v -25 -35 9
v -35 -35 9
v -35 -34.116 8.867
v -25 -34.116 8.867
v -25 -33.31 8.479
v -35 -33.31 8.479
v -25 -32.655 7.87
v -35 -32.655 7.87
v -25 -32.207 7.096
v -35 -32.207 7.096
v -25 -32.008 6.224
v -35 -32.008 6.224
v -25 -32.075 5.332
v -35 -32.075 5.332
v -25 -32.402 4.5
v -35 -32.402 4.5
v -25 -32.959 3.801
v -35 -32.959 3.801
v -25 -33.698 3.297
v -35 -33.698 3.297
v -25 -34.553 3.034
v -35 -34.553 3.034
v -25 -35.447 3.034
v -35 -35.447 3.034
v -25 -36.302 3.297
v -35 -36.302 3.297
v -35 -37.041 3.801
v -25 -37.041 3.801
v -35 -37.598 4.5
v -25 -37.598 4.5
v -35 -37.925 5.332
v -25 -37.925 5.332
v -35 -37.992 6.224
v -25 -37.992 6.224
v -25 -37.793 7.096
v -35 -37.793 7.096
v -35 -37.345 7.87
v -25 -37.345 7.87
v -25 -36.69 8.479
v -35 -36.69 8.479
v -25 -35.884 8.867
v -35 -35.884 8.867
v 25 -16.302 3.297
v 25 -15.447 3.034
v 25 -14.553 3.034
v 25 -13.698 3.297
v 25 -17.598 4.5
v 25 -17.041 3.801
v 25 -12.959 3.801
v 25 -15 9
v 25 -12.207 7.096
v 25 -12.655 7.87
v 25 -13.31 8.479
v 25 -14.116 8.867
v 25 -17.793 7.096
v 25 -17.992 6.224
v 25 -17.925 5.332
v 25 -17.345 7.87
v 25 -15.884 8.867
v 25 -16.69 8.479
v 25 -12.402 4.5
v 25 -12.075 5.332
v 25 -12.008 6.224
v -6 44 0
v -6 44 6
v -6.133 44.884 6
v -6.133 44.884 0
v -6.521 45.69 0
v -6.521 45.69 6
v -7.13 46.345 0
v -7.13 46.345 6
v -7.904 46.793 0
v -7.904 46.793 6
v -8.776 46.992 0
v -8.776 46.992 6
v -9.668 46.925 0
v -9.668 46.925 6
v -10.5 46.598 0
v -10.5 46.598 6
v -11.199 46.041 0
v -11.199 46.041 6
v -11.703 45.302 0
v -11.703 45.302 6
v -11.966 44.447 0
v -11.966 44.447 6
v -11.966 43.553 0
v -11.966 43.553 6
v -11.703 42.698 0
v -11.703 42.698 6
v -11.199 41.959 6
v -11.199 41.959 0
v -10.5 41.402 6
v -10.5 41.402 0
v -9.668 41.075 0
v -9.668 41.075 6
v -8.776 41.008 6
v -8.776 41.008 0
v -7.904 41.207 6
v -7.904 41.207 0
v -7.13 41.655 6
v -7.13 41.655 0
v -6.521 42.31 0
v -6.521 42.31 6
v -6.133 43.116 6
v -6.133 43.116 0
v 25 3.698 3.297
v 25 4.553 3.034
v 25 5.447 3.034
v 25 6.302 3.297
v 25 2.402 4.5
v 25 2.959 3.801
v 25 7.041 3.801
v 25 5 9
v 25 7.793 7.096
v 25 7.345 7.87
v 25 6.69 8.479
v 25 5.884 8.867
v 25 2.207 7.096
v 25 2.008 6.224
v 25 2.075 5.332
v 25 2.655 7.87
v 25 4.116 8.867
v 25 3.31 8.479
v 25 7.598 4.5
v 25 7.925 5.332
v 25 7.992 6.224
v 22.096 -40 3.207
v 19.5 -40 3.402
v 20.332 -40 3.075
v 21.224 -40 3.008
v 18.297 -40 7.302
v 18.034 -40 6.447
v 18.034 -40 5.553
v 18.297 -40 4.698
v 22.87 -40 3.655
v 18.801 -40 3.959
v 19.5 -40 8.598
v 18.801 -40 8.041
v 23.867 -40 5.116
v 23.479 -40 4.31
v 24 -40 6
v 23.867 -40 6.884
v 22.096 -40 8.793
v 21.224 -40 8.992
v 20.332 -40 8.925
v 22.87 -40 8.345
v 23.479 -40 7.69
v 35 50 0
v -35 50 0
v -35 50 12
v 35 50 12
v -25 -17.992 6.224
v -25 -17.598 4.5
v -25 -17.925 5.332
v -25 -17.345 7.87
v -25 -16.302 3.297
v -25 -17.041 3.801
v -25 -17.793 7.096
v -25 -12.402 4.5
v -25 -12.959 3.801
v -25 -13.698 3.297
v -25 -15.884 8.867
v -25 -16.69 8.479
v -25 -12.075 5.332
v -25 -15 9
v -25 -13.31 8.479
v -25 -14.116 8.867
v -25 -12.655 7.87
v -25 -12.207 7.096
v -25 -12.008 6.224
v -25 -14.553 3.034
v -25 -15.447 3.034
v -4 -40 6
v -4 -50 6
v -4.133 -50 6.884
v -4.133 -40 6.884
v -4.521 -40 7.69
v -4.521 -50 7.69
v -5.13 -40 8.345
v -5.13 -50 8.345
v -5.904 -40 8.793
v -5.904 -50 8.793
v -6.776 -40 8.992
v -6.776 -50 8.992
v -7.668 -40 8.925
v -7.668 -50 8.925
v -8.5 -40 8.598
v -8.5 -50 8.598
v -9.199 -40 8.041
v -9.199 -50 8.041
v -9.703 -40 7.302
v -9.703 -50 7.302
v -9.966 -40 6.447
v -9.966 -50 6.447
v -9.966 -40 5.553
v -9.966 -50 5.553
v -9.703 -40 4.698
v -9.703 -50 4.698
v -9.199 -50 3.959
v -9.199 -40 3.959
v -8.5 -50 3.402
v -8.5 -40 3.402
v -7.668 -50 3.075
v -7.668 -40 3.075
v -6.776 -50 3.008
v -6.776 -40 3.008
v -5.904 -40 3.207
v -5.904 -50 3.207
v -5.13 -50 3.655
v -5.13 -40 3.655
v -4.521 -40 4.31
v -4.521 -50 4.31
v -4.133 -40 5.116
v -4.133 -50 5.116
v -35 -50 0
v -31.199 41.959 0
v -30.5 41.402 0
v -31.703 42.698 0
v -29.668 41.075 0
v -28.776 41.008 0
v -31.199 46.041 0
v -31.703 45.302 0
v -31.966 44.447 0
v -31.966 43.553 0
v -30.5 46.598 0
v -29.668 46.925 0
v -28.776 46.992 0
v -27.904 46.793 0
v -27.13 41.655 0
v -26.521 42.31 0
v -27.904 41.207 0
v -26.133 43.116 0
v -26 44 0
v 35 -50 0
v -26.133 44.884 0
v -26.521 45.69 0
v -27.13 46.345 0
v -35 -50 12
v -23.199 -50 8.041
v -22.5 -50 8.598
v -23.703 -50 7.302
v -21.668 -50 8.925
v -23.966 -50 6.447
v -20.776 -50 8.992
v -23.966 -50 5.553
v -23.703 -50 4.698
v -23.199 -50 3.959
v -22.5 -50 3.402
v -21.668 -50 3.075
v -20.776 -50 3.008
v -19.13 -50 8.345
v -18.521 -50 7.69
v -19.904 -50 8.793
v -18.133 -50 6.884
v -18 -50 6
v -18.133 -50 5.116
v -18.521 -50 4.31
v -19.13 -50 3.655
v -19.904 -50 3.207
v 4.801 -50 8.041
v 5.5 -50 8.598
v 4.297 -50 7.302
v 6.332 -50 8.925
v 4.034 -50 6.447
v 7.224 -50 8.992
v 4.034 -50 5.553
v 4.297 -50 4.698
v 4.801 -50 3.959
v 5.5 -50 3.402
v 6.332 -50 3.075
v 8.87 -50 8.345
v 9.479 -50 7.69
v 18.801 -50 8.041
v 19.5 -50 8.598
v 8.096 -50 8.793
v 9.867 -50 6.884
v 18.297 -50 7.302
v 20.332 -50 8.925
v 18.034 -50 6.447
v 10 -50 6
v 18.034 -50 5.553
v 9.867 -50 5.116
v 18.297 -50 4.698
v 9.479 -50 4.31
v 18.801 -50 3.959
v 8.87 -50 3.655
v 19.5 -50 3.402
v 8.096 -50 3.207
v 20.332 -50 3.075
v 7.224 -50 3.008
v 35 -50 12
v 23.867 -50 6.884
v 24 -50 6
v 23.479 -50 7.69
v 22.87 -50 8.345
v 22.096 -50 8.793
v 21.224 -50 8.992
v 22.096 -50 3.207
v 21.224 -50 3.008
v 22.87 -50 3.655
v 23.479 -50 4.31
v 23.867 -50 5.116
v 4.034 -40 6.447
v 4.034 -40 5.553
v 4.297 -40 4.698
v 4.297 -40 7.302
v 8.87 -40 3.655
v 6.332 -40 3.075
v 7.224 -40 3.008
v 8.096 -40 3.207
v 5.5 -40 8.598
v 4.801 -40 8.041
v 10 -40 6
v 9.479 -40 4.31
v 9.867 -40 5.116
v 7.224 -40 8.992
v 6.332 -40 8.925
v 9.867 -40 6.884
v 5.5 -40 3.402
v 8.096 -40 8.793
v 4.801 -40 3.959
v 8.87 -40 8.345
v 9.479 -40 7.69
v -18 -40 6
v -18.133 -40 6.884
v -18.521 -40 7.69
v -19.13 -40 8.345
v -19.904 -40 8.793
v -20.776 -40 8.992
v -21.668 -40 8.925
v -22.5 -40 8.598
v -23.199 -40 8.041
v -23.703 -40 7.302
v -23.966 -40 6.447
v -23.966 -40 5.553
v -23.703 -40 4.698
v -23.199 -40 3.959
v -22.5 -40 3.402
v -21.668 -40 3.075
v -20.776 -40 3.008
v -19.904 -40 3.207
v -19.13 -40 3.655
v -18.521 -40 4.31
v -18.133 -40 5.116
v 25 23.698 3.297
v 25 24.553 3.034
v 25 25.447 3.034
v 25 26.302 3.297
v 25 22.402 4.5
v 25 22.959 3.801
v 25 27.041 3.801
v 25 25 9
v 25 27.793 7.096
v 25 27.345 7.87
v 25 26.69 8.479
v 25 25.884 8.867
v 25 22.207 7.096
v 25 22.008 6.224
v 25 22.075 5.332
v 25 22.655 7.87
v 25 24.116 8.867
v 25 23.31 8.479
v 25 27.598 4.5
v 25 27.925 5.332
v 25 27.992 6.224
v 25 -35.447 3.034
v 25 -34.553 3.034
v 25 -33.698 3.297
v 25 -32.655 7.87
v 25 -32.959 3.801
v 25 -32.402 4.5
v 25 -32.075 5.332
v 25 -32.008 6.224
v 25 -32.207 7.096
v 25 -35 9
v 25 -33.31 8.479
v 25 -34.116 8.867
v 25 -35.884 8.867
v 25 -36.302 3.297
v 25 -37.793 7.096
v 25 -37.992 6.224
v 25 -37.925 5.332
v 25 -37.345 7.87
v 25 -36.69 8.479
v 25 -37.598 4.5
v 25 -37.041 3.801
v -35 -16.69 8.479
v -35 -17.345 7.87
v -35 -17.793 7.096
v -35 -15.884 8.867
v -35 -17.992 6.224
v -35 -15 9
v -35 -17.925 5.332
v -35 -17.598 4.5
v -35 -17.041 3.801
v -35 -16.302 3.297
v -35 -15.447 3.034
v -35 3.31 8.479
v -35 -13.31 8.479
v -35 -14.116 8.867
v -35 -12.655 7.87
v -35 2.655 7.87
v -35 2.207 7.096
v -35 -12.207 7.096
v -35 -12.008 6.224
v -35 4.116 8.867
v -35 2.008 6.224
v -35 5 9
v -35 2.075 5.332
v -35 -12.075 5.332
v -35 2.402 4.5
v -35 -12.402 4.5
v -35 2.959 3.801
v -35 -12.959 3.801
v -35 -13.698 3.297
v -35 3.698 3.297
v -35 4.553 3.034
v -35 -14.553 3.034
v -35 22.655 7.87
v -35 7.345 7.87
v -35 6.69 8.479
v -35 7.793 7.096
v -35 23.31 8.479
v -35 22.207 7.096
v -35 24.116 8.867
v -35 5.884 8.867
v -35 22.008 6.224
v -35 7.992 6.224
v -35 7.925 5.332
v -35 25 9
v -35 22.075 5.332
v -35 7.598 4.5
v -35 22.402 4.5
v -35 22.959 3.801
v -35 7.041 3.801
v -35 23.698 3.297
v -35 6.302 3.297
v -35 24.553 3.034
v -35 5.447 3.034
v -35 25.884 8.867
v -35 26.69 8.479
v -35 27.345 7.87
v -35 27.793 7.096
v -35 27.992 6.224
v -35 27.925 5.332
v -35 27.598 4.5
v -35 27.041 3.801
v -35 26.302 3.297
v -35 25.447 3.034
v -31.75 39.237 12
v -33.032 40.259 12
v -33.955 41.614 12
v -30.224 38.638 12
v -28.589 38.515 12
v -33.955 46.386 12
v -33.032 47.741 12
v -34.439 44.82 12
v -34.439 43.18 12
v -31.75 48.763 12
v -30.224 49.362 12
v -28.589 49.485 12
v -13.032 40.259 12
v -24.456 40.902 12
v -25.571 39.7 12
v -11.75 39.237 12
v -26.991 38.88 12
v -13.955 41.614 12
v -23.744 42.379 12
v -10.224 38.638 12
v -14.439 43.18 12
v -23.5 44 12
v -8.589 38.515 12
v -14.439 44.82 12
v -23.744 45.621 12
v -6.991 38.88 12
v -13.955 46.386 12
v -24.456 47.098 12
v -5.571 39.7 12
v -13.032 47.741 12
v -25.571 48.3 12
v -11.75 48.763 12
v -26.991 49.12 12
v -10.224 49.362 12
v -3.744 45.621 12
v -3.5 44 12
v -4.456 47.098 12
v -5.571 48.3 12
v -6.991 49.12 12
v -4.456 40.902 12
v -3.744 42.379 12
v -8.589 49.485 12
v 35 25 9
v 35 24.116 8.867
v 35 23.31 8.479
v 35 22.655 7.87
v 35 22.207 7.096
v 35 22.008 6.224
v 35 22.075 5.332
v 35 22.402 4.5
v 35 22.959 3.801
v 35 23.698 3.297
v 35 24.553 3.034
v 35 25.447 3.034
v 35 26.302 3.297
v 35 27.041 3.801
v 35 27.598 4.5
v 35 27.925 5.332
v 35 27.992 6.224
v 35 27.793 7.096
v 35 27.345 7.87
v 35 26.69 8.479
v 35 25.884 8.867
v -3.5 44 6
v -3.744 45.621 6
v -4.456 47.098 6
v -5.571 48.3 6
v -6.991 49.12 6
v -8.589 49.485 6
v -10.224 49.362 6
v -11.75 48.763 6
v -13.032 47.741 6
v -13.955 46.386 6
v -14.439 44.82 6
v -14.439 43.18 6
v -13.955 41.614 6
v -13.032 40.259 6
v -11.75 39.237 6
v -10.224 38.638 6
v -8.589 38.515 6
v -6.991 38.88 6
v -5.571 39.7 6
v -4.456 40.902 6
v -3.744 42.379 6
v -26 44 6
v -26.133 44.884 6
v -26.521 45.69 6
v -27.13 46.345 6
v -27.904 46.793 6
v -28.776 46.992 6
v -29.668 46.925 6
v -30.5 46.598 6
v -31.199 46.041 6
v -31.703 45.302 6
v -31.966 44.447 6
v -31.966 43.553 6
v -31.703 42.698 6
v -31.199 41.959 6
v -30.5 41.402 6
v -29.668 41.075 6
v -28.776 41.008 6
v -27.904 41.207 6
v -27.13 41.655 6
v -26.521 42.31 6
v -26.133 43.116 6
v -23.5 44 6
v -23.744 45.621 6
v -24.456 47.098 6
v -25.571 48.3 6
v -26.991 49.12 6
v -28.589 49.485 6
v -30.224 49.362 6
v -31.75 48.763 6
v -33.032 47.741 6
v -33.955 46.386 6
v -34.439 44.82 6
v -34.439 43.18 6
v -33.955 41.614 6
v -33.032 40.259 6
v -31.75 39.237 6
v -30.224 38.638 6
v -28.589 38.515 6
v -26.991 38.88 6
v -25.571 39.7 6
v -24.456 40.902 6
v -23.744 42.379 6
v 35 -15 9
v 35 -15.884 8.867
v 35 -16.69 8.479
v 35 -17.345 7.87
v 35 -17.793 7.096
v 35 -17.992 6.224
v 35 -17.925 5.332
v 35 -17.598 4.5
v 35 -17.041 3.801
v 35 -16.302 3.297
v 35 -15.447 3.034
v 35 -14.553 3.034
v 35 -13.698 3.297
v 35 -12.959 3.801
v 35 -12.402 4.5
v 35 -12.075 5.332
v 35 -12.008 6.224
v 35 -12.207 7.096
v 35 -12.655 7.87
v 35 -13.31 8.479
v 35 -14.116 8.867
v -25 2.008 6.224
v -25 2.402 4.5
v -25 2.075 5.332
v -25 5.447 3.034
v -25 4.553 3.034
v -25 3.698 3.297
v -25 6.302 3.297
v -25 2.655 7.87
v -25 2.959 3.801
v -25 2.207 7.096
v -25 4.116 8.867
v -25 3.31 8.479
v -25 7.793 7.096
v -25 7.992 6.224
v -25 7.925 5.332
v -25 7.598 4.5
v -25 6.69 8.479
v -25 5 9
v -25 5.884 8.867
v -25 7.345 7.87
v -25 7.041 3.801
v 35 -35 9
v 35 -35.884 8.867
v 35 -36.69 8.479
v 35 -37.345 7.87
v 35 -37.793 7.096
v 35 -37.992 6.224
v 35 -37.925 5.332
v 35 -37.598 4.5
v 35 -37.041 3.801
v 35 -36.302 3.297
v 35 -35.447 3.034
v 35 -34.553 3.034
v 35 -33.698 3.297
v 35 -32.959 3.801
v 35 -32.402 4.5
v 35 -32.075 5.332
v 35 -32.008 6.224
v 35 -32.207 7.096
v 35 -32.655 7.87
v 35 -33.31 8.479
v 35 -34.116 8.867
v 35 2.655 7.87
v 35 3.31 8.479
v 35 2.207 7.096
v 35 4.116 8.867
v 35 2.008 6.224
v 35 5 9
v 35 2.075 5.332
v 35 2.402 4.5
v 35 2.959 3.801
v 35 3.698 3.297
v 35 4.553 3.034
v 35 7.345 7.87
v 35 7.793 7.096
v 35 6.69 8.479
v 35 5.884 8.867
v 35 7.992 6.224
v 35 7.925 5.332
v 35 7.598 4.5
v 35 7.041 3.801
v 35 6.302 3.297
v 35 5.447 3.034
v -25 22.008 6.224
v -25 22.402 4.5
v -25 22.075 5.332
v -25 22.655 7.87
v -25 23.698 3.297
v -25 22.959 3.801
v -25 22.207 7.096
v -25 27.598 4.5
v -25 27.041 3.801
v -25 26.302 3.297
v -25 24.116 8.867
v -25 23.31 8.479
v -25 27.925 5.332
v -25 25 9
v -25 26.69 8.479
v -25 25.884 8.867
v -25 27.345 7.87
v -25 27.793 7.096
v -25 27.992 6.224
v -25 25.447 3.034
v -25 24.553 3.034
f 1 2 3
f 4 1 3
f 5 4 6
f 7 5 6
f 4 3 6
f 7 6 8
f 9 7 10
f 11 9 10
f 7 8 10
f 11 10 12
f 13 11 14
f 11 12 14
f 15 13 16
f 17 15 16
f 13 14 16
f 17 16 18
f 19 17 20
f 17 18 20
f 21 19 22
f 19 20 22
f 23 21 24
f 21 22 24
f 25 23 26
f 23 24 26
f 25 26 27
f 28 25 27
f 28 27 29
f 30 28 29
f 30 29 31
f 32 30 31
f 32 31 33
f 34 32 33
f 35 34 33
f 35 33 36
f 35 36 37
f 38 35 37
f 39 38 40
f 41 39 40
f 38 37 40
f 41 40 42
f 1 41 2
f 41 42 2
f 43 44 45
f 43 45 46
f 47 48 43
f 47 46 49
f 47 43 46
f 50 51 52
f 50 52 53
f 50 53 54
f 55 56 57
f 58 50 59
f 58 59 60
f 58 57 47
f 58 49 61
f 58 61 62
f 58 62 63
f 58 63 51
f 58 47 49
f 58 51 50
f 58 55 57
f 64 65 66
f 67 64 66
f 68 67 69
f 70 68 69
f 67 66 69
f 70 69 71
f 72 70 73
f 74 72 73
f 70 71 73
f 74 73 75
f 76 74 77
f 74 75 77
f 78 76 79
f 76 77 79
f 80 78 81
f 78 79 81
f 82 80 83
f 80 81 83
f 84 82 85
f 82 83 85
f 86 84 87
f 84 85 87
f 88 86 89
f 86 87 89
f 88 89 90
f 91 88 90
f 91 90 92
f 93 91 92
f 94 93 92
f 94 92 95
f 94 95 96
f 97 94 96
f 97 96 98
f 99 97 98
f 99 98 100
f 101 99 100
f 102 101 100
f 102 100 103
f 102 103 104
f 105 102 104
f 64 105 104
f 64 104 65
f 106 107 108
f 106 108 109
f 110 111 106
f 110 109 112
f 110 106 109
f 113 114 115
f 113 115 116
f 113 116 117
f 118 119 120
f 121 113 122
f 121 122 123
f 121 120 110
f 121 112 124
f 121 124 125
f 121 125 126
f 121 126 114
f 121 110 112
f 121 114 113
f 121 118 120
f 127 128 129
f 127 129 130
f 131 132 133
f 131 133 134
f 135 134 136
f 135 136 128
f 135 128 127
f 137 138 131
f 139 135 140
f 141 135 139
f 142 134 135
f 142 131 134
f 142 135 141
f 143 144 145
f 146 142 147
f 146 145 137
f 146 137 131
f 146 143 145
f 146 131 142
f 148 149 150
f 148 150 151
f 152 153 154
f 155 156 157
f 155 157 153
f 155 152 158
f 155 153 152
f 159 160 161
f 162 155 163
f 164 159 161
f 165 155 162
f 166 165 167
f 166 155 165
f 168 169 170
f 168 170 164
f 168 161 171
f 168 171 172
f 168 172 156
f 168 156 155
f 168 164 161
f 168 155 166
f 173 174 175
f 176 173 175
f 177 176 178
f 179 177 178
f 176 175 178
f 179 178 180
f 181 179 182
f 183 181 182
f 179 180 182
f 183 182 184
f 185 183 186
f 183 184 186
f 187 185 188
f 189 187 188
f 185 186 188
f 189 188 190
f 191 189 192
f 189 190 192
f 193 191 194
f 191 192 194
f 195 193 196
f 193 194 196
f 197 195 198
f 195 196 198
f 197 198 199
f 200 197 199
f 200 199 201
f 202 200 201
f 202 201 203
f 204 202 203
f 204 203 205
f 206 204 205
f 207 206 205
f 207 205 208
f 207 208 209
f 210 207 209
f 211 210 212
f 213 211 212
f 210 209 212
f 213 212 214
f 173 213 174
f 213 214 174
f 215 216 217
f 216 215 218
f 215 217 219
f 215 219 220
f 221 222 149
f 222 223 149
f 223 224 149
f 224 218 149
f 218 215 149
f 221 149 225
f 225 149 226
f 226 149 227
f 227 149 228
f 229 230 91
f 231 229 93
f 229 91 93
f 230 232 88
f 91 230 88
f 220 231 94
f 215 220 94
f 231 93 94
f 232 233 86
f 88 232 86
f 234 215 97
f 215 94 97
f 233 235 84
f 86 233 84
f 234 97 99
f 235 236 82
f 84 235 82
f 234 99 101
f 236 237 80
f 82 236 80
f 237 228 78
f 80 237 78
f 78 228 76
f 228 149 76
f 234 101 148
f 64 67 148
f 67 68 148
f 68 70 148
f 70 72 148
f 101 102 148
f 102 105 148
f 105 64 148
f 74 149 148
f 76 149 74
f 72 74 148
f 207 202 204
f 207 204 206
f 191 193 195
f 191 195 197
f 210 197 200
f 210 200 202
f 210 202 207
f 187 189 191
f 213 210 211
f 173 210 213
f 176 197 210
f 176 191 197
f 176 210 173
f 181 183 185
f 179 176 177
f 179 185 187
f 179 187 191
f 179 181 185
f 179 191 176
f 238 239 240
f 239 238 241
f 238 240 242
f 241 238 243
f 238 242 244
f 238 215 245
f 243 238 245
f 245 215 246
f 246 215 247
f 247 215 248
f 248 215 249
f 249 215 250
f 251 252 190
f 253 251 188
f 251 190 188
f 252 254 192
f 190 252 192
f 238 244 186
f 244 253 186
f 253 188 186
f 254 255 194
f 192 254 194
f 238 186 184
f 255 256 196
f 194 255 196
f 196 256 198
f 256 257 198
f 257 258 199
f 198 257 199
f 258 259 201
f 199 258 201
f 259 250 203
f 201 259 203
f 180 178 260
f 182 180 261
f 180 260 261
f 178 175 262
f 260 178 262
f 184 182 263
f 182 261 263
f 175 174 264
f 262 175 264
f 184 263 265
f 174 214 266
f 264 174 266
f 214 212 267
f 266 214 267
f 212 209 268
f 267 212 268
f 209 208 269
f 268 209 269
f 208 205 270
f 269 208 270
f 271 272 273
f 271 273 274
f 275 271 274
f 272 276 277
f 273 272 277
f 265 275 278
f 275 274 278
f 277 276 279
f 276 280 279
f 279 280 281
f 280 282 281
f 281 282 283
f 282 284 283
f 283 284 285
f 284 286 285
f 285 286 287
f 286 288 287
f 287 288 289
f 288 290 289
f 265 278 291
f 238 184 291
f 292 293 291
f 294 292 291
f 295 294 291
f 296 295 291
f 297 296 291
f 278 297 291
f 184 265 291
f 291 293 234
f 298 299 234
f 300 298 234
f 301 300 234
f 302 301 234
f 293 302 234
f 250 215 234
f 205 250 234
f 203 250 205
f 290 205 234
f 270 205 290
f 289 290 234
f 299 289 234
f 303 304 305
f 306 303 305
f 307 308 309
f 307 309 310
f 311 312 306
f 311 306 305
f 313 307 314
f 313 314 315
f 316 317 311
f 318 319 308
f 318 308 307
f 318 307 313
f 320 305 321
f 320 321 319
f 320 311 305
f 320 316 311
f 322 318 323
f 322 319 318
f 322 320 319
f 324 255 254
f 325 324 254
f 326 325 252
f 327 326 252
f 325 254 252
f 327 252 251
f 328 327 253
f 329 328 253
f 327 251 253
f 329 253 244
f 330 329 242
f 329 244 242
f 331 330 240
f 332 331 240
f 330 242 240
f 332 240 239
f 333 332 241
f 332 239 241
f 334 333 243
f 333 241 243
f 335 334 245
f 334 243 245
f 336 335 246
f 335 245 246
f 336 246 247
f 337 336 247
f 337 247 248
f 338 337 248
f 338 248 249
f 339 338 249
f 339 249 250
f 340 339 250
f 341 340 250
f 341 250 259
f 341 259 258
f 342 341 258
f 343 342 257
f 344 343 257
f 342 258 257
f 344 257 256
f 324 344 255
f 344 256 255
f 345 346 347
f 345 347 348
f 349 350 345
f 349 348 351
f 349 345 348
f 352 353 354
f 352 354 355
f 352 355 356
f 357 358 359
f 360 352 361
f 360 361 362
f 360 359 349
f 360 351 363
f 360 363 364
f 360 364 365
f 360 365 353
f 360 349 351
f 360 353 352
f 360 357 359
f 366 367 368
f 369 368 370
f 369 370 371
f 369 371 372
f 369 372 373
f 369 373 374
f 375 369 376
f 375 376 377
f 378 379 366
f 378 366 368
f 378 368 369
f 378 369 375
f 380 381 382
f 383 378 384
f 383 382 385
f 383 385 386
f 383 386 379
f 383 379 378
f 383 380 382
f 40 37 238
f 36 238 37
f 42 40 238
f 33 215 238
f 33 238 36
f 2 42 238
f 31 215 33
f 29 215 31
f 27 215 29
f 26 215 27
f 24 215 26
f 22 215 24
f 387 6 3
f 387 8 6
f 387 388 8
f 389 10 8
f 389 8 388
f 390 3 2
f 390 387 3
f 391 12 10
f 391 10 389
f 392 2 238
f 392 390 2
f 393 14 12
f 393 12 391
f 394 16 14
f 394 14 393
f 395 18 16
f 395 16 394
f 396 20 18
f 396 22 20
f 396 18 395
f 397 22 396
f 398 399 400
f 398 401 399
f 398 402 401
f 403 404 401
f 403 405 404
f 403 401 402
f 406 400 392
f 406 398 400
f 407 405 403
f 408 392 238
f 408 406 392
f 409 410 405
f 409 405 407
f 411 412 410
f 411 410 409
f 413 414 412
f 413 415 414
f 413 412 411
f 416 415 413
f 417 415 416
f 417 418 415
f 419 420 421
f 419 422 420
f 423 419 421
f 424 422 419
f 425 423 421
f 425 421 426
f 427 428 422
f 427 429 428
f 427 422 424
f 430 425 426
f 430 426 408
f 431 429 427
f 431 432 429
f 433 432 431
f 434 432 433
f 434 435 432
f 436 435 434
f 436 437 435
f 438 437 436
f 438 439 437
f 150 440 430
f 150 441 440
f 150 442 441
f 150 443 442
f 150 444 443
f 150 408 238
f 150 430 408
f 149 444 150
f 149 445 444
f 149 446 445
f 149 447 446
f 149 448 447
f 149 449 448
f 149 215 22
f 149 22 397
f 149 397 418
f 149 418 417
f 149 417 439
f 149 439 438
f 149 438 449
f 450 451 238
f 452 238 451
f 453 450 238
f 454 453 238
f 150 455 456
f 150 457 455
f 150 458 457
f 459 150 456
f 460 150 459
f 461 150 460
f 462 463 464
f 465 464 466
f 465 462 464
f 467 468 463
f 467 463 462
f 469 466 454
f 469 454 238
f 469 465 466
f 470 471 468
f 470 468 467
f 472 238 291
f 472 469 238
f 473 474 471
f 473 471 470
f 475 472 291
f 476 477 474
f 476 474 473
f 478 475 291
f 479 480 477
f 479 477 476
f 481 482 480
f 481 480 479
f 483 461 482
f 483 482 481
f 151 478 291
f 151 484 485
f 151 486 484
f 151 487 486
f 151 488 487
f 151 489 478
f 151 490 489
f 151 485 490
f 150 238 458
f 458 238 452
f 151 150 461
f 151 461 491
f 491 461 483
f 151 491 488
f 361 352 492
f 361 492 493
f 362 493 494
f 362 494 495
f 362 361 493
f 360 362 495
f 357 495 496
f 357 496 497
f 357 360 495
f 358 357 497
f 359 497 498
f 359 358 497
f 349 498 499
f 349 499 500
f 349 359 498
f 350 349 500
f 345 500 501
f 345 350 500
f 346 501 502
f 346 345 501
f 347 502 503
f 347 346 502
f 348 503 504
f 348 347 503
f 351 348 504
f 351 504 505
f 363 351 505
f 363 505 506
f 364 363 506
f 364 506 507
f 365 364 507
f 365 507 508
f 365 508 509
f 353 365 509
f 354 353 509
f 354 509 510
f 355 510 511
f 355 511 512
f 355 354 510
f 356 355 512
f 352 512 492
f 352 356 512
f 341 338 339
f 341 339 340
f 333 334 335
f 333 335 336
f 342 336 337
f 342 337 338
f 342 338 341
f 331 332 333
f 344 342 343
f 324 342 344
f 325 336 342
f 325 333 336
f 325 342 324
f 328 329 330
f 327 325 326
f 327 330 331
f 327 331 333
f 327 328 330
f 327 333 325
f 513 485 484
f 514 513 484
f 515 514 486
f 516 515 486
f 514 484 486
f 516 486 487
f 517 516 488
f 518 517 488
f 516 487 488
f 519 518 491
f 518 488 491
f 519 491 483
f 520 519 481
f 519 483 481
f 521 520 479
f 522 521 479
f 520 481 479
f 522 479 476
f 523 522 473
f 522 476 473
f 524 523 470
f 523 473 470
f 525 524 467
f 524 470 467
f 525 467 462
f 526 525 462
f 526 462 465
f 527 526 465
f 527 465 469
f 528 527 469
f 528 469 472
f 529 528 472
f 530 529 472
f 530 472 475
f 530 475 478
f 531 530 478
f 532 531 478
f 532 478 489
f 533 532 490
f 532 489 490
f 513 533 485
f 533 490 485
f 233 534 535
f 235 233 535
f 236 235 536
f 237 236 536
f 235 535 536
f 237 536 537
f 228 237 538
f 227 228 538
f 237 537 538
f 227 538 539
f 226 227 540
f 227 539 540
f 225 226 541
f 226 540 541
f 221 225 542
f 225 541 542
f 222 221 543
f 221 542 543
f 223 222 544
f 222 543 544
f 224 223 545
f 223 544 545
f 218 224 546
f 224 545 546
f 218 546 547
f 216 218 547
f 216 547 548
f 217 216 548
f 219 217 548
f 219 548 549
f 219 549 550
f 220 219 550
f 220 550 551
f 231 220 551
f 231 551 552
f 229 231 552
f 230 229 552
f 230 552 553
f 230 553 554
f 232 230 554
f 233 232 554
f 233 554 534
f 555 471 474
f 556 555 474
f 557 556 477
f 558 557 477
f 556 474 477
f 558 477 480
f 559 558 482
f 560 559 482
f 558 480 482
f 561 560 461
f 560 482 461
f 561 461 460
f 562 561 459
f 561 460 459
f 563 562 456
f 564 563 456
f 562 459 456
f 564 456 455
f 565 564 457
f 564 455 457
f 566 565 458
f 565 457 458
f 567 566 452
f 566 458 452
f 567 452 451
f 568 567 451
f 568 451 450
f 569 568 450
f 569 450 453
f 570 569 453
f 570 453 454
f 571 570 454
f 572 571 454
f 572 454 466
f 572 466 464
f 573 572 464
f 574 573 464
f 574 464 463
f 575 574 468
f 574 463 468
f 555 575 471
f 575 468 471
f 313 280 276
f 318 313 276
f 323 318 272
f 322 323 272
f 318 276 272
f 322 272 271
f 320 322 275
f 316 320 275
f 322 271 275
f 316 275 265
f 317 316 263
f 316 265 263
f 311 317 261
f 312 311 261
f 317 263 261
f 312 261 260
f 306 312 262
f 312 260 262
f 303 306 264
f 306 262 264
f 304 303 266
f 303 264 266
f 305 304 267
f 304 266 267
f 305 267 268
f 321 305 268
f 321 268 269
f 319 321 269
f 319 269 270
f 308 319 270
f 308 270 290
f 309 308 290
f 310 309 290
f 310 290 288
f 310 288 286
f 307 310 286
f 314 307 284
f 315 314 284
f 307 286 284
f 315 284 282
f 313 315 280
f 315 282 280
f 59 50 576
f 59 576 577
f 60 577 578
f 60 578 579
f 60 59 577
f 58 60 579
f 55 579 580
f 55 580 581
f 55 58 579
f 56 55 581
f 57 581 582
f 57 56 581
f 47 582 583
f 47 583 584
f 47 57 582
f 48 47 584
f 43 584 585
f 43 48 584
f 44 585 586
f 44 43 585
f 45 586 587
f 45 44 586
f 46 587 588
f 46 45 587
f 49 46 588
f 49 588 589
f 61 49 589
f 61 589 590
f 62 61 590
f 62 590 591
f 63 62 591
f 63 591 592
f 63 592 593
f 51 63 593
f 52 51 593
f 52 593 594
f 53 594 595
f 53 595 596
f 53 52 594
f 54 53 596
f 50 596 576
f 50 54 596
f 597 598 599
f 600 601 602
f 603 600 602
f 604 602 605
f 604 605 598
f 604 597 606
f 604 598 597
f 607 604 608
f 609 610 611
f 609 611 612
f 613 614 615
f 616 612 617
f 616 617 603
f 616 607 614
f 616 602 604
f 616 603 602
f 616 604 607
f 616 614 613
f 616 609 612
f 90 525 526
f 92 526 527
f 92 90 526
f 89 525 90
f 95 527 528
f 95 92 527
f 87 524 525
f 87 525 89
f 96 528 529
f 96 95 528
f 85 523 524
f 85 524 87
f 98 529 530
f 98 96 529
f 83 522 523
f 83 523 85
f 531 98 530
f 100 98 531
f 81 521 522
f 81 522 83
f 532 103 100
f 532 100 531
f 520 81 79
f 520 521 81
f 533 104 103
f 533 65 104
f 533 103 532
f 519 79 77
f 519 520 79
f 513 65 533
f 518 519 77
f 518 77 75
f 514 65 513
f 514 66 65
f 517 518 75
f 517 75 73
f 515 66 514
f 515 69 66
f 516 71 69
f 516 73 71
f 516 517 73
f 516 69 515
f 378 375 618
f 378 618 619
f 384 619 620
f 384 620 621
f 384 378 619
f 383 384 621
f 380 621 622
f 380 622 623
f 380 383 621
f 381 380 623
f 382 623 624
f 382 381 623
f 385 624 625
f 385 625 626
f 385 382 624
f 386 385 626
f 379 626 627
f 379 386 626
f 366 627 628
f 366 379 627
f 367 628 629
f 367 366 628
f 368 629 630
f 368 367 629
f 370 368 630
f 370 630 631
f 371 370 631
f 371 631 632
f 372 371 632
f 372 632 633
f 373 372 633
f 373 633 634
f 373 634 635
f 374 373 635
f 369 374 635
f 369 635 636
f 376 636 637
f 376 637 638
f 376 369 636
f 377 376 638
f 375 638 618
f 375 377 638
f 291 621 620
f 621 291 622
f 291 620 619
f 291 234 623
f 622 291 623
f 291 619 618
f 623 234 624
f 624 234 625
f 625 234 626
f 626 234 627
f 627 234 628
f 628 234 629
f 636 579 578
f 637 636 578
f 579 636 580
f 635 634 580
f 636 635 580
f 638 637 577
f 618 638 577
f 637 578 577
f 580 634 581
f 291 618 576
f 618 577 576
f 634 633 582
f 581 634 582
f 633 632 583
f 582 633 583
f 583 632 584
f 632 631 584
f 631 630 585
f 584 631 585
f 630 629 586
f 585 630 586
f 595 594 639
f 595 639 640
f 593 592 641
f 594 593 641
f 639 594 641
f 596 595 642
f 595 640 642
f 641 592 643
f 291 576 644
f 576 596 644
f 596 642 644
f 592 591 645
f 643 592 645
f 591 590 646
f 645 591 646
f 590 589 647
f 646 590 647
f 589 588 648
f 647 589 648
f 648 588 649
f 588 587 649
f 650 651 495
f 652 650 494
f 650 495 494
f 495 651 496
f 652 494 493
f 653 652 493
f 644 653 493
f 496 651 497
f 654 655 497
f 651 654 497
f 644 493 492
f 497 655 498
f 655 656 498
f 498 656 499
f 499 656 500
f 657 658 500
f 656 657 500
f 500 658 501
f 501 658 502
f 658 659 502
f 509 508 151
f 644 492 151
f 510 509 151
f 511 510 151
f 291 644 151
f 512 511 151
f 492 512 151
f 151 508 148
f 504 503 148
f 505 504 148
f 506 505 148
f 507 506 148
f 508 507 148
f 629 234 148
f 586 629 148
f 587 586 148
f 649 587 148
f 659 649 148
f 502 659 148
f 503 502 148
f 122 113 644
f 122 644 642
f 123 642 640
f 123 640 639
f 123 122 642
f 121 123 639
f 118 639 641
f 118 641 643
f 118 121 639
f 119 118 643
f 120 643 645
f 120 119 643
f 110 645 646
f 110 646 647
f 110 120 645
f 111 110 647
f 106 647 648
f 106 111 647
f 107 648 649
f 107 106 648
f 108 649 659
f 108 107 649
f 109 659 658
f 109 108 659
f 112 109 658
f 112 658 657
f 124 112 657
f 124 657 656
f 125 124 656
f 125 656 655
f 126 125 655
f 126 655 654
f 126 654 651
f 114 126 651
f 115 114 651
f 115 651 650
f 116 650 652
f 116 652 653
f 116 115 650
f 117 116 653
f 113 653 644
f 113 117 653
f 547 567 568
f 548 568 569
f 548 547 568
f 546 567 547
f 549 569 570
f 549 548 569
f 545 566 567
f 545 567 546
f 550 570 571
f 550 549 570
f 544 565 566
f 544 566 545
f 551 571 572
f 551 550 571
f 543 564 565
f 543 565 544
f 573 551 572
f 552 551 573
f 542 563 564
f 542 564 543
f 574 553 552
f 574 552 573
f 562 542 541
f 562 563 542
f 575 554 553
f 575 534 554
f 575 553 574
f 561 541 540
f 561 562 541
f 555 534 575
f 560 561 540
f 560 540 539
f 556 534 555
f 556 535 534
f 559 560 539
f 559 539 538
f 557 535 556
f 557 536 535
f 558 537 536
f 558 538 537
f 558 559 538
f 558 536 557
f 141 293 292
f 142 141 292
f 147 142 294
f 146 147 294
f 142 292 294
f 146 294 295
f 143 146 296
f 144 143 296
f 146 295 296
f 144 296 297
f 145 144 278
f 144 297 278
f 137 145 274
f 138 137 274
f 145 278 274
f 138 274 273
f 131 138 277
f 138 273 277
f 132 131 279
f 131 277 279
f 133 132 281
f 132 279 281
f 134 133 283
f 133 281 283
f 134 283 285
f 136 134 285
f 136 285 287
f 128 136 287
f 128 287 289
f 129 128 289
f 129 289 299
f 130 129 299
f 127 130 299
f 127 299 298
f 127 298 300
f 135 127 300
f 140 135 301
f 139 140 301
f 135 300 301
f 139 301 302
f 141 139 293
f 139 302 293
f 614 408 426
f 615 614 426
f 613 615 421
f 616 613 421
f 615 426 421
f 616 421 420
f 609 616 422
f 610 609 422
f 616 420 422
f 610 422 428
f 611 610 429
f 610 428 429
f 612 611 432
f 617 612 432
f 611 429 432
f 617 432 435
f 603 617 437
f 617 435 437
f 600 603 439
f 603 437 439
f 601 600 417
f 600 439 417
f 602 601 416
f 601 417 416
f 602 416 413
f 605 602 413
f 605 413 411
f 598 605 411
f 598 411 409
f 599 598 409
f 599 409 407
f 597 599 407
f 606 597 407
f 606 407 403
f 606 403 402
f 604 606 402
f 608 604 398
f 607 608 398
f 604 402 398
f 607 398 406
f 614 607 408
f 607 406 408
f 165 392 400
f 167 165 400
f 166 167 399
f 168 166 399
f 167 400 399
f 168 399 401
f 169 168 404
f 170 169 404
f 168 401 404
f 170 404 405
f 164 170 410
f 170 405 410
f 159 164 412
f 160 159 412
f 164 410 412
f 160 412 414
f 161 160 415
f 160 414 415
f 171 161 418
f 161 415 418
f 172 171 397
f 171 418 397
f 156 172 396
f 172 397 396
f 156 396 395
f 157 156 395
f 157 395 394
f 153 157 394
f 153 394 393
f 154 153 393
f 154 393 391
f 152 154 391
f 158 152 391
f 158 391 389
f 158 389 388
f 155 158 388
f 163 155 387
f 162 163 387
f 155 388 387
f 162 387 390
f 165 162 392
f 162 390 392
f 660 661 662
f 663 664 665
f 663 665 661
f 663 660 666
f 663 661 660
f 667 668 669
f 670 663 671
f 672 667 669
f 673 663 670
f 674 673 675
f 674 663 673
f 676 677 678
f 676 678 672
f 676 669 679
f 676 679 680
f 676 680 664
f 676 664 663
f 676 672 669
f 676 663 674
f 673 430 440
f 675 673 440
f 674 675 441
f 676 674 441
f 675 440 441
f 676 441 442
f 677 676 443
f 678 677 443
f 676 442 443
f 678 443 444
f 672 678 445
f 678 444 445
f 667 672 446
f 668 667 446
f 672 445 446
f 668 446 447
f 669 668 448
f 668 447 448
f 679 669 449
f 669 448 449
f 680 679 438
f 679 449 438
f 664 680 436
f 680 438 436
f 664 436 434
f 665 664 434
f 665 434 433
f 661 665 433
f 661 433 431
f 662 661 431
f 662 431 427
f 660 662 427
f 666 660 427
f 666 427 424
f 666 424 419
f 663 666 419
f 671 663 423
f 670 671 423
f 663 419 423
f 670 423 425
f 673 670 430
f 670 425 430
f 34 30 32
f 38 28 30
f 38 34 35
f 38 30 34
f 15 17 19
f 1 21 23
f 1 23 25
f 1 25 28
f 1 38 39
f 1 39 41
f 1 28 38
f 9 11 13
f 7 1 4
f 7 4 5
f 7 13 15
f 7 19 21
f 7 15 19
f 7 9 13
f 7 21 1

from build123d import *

# Parameters (mm, degrees)
SKETCH_1_W          = 70
SKETCH_1_H          = 100
EXTRUDE_1_DEPTH     = 12
SKETCH_2_R          = 3
CUT_EXTRUDE_1_DEPTH = 10
SKETCH_3_R          = 3
CUT_EXTRUDE_2_DEPTH = 12
SKETCH_4_R          = 5.5
CUT_EXTRUDE_3_DEPTH = 6
CUT_EXTRUDE_START   = -10
SKETCH_5_R          = 3
CUT_EXTRUDE_4_DEPTH = 10
SKETCH_6_R          = 3
CUT_EXTRUDE_5_DEPTH = 10


with BuildPart() as part:
    # 草图1 → 凸台-拉伸1 (new body)
    with BuildSketch(Plane.XY):
        Rectangle(SKETCH_1_W, SKETCH_1_H)
    extrude(amount=EXTRUDE_1_DEPTH)

    # 草图2 → 切除-拉伸1 (cut)
    with BuildSketch(Plane.ZY.offset(35)):
        with Locations((6, -35)):
            Circle(SKETCH_2_R)
        with Locations((6, -15)):
            Circle(SKETCH_2_R)
        with Locations((6, 5)):
            Circle(SKETCH_2_R)
        with Locations((6, 25)):
            Circle(SKETCH_2_R)
    extrude(amount=-CUT_EXTRUDE_1_DEPTH, mode=Mode.SUBTRACT)

    # 草图3 → 切除-拉伸2 (cut)
    with BuildSketch(Plane.XY.offset(12)):
        with Locations((-29, 44)):
            Circle(SKETCH_3_R)
        with Locations((-9, 44)):
            Circle(SKETCH_3_R)
    extrude(amount=-CUT_EXTRUDE_2_DEPTH, mode=Mode.SUBTRACT)

    # 草图4 → 切除-拉伸3 (cut)
    with BuildSketch(Plane.XY.offset(12)):
        with Locations((-29, 44)):
            Circle(SKETCH_4_R)
        with Locations((-9, 44)):
            Circle(SKETCH_4_R)
    extrude(amount=-CUT_EXTRUDE_3_DEPTH, mode=Mode.SUBTRACT)

    # 草图5 → 切除-拉伸4 (cut)
    with BuildSketch(Plane(origin=(35, 0, 0), x_dir=(0, 0, -1), z_dir=(1, 0, 0)).offset(CUT_EXTRUDE_START)):
        with Locations(Location((-6, -35, 0), (0, 0, 180))):
            Circle(SKETCH_5_R)
        with Locations(Location((-6, -15, 0), (0, 0, 180))):
            Circle(SKETCH_5_R)
        with Locations(Location((-6, 5, 0), (0, 0, 180))):
            Circle(SKETCH_5_R)
        with Locations(Location((-6, 25, 0), (0, 0, 180))):
            Circle(SKETCH_5_R)
    extrude(amount=CUT_EXTRUDE_4_DEPTH, mode=Mode.SUBTRACT)

    # 草图6 → 切除-拉伸5 (cut)
    with BuildSketch(Plane.XZ.offset(50)):
        with Locations((-21, 6)):
            Circle(SKETCH_6_R)
        with Locations((-7, 6)):
            Circle(SKETCH_6_R)
        with Locations((7, 6)):
            Circle(SKETCH_6_R)
        with Locations((21, 6)):
            Circle(SKETCH_6_R)
    extrude(amount=-CUT_EXTRUDE_5_DEPTH, mode=Mode.SUBTRACT)


solid = part.part
